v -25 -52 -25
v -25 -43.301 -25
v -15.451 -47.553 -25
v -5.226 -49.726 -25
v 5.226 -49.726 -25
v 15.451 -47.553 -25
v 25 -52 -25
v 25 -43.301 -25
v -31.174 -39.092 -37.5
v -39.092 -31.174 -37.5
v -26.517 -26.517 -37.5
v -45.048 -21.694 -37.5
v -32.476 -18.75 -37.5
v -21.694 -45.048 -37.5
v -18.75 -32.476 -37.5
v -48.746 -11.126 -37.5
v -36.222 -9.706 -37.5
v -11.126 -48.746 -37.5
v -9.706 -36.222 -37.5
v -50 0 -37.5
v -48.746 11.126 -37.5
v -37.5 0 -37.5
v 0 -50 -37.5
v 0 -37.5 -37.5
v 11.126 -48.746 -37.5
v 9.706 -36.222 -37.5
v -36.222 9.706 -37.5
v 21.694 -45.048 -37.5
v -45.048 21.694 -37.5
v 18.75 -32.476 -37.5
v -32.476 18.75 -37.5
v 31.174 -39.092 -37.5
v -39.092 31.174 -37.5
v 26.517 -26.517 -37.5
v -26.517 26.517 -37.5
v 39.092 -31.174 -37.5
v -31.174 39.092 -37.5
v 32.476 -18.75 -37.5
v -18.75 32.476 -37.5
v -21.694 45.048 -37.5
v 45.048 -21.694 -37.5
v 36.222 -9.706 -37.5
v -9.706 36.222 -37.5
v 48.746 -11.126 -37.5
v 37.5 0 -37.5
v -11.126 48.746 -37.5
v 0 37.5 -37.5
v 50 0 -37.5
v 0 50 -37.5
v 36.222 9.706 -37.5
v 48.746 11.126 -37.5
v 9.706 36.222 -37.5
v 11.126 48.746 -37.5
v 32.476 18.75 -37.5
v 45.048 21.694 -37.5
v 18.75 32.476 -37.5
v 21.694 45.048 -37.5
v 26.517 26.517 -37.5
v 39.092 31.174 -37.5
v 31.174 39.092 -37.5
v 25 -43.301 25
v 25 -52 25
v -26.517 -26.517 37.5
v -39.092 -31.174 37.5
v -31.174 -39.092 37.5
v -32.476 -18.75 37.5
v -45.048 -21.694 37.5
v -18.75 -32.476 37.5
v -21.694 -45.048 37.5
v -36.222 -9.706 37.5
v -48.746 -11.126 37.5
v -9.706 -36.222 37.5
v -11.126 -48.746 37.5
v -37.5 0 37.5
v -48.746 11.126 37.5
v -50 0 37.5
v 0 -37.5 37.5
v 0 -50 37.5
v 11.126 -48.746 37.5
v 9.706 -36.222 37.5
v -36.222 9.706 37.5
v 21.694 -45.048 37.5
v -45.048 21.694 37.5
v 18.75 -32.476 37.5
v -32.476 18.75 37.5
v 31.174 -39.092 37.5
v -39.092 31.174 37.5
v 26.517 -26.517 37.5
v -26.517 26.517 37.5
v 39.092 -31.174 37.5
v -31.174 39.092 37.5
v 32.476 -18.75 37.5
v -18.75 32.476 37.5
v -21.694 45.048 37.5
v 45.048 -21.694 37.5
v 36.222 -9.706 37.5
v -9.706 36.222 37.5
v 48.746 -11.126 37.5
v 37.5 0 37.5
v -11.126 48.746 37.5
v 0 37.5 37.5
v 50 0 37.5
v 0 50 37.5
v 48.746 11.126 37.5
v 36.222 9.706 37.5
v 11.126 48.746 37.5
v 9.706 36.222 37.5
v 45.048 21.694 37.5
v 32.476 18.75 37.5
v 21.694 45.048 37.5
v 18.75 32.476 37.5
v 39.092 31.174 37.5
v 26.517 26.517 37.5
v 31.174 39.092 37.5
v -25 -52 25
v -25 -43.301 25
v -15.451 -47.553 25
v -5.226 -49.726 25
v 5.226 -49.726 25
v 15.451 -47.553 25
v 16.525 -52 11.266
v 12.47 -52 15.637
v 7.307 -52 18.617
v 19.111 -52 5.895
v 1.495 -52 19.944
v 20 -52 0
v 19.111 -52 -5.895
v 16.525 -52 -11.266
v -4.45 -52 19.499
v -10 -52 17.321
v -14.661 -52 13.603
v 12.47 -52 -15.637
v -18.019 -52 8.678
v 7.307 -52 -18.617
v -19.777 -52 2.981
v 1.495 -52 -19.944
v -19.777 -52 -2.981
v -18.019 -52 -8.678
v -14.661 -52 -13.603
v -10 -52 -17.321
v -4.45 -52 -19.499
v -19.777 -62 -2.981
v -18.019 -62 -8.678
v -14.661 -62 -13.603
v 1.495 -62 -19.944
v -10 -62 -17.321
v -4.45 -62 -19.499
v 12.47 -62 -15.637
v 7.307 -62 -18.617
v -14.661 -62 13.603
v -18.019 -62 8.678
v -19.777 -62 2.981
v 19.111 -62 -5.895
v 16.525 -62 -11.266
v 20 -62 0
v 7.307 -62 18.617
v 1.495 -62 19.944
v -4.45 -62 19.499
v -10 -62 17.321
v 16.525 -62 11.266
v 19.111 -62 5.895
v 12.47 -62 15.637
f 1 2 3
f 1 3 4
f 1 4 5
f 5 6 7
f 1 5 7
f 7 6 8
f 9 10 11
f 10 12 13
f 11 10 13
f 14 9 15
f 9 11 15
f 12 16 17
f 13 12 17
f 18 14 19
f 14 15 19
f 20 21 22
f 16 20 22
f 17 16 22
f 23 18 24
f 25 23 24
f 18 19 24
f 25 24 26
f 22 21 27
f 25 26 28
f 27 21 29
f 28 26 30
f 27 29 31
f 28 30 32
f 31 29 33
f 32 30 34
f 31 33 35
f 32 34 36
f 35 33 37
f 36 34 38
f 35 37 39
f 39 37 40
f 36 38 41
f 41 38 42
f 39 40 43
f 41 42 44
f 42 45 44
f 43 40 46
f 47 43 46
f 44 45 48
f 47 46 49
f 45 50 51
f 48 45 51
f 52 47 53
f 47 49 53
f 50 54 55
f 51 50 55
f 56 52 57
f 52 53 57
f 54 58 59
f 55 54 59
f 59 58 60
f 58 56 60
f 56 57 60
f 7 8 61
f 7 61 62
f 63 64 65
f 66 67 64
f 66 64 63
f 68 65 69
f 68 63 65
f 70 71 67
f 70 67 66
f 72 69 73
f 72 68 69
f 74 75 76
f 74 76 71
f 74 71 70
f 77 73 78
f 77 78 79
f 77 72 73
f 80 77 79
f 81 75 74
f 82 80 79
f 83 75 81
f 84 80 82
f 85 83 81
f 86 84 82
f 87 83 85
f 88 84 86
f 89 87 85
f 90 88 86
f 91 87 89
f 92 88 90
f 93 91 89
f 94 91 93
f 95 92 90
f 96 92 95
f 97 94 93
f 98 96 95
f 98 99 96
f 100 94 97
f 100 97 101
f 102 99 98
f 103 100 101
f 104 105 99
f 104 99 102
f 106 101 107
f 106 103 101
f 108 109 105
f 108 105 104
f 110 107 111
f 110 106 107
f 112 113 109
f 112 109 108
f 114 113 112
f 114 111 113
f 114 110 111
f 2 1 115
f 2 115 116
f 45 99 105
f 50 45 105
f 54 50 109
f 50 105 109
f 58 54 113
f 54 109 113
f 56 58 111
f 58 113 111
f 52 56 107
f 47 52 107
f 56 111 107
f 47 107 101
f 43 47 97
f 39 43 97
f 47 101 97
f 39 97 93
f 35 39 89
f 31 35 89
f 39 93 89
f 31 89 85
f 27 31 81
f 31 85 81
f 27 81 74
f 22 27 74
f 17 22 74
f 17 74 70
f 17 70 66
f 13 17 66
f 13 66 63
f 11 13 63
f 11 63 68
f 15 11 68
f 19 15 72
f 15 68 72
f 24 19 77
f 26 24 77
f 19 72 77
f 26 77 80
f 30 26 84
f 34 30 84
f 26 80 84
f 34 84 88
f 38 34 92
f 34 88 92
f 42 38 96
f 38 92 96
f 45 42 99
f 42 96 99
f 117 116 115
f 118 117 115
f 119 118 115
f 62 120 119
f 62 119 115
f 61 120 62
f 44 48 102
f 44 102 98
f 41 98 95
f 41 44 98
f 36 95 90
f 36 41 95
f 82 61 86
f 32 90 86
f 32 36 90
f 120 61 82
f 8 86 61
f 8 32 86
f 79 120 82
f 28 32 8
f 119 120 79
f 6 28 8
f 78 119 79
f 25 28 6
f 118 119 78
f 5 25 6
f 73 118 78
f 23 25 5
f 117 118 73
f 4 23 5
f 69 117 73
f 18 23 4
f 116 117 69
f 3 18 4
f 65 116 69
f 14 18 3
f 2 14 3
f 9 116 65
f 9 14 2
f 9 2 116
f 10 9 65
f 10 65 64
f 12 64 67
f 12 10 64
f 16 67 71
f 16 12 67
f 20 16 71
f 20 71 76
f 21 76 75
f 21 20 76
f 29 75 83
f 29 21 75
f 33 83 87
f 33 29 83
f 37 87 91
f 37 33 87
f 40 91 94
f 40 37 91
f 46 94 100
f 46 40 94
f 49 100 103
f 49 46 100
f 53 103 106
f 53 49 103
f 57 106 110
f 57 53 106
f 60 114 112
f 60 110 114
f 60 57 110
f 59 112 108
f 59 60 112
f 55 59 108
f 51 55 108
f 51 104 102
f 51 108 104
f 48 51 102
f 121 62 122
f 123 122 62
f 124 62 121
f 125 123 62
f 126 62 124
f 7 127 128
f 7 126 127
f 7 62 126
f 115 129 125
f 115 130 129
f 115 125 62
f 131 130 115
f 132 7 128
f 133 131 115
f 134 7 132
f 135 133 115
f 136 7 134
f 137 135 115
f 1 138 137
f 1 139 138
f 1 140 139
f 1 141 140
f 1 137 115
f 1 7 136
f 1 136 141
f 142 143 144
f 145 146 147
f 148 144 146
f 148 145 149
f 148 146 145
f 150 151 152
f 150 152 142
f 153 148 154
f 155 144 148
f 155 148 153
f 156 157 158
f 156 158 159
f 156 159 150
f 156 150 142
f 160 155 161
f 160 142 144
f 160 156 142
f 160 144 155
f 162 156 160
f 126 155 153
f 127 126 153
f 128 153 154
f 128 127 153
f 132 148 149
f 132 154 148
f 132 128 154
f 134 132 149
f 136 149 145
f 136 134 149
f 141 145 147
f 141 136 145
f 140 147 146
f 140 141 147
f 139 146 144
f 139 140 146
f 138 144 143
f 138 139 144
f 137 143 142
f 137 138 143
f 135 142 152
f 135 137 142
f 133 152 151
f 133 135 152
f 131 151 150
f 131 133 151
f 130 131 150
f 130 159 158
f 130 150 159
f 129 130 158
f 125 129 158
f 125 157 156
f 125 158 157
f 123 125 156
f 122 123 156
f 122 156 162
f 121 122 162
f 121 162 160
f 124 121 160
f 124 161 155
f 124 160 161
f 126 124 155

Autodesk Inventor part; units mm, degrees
ref_plane "YZ Plane" through (0, 0, 0) normal (1, 0, 0) x (0, 1, 0)
ref_plane "XZ Plane" through (0, 0, 0) normal (0, 1, 0) x (-1, 0, 0)
ref_plane "XY Plane" through (0, 0, 0) normal (0, 0, 1) x (1, 0, 0)
sketch "Sketch1" plane through (0, 0, 0) normal (0, 0, 1) x (1, 0, 0)
  circle A0 centre (0, 0) radius 50
  dimension "d0" = 100
extrude "Extrusion1" add sketch "Sketch1" along normal mid plane 75
sketch "Sketch2" plane through (0, 0, 37.5) normal (0, 0, 1) x (1, 0, 0)
  circle A0 centre (0, 0) radius 37.5
  dimension "d3" = 75
extrude "Extrusion2" cut sketch "Sketch2" against normal through all
sketch "Sketch4" plane through (0, 0, 0) normal (0, 0, 1) x (1, 0, 0)
  line L0 (25, -43.3013) -> (25, -52)
  line L1 (25, -52) -> (-25, -52)
  line L2 (-25, -52) -> (-25, -43.3013)
  arc A0 (-25, -43.3013) -> (25, -43.3013) centre (0, 0) ccw
  circle A1 centre (0, 0) radius 50 projected
  line L3 (0, 0) -> (0, -66.2618) construction
  dimension "d22" = 50
  dimension "d24" = 90
  dimension "d25" = 50
  dimension "d26" = 52
extrude "Extrusion3" add sketch "Sketch4" along normal mid plane 50 contours L0 L1 L2 A0
sketch "Sketch6" plane through (-25, -52, 25) normal (0, -1, 0) x (1, 0, 0)
  circle A0 centre (25, -25) radius 20
  dimension "d27" = 40
extrude "Extrusion5" add sketch "Sketch6" along normal blind 10
properties material "ABS Plastic"
